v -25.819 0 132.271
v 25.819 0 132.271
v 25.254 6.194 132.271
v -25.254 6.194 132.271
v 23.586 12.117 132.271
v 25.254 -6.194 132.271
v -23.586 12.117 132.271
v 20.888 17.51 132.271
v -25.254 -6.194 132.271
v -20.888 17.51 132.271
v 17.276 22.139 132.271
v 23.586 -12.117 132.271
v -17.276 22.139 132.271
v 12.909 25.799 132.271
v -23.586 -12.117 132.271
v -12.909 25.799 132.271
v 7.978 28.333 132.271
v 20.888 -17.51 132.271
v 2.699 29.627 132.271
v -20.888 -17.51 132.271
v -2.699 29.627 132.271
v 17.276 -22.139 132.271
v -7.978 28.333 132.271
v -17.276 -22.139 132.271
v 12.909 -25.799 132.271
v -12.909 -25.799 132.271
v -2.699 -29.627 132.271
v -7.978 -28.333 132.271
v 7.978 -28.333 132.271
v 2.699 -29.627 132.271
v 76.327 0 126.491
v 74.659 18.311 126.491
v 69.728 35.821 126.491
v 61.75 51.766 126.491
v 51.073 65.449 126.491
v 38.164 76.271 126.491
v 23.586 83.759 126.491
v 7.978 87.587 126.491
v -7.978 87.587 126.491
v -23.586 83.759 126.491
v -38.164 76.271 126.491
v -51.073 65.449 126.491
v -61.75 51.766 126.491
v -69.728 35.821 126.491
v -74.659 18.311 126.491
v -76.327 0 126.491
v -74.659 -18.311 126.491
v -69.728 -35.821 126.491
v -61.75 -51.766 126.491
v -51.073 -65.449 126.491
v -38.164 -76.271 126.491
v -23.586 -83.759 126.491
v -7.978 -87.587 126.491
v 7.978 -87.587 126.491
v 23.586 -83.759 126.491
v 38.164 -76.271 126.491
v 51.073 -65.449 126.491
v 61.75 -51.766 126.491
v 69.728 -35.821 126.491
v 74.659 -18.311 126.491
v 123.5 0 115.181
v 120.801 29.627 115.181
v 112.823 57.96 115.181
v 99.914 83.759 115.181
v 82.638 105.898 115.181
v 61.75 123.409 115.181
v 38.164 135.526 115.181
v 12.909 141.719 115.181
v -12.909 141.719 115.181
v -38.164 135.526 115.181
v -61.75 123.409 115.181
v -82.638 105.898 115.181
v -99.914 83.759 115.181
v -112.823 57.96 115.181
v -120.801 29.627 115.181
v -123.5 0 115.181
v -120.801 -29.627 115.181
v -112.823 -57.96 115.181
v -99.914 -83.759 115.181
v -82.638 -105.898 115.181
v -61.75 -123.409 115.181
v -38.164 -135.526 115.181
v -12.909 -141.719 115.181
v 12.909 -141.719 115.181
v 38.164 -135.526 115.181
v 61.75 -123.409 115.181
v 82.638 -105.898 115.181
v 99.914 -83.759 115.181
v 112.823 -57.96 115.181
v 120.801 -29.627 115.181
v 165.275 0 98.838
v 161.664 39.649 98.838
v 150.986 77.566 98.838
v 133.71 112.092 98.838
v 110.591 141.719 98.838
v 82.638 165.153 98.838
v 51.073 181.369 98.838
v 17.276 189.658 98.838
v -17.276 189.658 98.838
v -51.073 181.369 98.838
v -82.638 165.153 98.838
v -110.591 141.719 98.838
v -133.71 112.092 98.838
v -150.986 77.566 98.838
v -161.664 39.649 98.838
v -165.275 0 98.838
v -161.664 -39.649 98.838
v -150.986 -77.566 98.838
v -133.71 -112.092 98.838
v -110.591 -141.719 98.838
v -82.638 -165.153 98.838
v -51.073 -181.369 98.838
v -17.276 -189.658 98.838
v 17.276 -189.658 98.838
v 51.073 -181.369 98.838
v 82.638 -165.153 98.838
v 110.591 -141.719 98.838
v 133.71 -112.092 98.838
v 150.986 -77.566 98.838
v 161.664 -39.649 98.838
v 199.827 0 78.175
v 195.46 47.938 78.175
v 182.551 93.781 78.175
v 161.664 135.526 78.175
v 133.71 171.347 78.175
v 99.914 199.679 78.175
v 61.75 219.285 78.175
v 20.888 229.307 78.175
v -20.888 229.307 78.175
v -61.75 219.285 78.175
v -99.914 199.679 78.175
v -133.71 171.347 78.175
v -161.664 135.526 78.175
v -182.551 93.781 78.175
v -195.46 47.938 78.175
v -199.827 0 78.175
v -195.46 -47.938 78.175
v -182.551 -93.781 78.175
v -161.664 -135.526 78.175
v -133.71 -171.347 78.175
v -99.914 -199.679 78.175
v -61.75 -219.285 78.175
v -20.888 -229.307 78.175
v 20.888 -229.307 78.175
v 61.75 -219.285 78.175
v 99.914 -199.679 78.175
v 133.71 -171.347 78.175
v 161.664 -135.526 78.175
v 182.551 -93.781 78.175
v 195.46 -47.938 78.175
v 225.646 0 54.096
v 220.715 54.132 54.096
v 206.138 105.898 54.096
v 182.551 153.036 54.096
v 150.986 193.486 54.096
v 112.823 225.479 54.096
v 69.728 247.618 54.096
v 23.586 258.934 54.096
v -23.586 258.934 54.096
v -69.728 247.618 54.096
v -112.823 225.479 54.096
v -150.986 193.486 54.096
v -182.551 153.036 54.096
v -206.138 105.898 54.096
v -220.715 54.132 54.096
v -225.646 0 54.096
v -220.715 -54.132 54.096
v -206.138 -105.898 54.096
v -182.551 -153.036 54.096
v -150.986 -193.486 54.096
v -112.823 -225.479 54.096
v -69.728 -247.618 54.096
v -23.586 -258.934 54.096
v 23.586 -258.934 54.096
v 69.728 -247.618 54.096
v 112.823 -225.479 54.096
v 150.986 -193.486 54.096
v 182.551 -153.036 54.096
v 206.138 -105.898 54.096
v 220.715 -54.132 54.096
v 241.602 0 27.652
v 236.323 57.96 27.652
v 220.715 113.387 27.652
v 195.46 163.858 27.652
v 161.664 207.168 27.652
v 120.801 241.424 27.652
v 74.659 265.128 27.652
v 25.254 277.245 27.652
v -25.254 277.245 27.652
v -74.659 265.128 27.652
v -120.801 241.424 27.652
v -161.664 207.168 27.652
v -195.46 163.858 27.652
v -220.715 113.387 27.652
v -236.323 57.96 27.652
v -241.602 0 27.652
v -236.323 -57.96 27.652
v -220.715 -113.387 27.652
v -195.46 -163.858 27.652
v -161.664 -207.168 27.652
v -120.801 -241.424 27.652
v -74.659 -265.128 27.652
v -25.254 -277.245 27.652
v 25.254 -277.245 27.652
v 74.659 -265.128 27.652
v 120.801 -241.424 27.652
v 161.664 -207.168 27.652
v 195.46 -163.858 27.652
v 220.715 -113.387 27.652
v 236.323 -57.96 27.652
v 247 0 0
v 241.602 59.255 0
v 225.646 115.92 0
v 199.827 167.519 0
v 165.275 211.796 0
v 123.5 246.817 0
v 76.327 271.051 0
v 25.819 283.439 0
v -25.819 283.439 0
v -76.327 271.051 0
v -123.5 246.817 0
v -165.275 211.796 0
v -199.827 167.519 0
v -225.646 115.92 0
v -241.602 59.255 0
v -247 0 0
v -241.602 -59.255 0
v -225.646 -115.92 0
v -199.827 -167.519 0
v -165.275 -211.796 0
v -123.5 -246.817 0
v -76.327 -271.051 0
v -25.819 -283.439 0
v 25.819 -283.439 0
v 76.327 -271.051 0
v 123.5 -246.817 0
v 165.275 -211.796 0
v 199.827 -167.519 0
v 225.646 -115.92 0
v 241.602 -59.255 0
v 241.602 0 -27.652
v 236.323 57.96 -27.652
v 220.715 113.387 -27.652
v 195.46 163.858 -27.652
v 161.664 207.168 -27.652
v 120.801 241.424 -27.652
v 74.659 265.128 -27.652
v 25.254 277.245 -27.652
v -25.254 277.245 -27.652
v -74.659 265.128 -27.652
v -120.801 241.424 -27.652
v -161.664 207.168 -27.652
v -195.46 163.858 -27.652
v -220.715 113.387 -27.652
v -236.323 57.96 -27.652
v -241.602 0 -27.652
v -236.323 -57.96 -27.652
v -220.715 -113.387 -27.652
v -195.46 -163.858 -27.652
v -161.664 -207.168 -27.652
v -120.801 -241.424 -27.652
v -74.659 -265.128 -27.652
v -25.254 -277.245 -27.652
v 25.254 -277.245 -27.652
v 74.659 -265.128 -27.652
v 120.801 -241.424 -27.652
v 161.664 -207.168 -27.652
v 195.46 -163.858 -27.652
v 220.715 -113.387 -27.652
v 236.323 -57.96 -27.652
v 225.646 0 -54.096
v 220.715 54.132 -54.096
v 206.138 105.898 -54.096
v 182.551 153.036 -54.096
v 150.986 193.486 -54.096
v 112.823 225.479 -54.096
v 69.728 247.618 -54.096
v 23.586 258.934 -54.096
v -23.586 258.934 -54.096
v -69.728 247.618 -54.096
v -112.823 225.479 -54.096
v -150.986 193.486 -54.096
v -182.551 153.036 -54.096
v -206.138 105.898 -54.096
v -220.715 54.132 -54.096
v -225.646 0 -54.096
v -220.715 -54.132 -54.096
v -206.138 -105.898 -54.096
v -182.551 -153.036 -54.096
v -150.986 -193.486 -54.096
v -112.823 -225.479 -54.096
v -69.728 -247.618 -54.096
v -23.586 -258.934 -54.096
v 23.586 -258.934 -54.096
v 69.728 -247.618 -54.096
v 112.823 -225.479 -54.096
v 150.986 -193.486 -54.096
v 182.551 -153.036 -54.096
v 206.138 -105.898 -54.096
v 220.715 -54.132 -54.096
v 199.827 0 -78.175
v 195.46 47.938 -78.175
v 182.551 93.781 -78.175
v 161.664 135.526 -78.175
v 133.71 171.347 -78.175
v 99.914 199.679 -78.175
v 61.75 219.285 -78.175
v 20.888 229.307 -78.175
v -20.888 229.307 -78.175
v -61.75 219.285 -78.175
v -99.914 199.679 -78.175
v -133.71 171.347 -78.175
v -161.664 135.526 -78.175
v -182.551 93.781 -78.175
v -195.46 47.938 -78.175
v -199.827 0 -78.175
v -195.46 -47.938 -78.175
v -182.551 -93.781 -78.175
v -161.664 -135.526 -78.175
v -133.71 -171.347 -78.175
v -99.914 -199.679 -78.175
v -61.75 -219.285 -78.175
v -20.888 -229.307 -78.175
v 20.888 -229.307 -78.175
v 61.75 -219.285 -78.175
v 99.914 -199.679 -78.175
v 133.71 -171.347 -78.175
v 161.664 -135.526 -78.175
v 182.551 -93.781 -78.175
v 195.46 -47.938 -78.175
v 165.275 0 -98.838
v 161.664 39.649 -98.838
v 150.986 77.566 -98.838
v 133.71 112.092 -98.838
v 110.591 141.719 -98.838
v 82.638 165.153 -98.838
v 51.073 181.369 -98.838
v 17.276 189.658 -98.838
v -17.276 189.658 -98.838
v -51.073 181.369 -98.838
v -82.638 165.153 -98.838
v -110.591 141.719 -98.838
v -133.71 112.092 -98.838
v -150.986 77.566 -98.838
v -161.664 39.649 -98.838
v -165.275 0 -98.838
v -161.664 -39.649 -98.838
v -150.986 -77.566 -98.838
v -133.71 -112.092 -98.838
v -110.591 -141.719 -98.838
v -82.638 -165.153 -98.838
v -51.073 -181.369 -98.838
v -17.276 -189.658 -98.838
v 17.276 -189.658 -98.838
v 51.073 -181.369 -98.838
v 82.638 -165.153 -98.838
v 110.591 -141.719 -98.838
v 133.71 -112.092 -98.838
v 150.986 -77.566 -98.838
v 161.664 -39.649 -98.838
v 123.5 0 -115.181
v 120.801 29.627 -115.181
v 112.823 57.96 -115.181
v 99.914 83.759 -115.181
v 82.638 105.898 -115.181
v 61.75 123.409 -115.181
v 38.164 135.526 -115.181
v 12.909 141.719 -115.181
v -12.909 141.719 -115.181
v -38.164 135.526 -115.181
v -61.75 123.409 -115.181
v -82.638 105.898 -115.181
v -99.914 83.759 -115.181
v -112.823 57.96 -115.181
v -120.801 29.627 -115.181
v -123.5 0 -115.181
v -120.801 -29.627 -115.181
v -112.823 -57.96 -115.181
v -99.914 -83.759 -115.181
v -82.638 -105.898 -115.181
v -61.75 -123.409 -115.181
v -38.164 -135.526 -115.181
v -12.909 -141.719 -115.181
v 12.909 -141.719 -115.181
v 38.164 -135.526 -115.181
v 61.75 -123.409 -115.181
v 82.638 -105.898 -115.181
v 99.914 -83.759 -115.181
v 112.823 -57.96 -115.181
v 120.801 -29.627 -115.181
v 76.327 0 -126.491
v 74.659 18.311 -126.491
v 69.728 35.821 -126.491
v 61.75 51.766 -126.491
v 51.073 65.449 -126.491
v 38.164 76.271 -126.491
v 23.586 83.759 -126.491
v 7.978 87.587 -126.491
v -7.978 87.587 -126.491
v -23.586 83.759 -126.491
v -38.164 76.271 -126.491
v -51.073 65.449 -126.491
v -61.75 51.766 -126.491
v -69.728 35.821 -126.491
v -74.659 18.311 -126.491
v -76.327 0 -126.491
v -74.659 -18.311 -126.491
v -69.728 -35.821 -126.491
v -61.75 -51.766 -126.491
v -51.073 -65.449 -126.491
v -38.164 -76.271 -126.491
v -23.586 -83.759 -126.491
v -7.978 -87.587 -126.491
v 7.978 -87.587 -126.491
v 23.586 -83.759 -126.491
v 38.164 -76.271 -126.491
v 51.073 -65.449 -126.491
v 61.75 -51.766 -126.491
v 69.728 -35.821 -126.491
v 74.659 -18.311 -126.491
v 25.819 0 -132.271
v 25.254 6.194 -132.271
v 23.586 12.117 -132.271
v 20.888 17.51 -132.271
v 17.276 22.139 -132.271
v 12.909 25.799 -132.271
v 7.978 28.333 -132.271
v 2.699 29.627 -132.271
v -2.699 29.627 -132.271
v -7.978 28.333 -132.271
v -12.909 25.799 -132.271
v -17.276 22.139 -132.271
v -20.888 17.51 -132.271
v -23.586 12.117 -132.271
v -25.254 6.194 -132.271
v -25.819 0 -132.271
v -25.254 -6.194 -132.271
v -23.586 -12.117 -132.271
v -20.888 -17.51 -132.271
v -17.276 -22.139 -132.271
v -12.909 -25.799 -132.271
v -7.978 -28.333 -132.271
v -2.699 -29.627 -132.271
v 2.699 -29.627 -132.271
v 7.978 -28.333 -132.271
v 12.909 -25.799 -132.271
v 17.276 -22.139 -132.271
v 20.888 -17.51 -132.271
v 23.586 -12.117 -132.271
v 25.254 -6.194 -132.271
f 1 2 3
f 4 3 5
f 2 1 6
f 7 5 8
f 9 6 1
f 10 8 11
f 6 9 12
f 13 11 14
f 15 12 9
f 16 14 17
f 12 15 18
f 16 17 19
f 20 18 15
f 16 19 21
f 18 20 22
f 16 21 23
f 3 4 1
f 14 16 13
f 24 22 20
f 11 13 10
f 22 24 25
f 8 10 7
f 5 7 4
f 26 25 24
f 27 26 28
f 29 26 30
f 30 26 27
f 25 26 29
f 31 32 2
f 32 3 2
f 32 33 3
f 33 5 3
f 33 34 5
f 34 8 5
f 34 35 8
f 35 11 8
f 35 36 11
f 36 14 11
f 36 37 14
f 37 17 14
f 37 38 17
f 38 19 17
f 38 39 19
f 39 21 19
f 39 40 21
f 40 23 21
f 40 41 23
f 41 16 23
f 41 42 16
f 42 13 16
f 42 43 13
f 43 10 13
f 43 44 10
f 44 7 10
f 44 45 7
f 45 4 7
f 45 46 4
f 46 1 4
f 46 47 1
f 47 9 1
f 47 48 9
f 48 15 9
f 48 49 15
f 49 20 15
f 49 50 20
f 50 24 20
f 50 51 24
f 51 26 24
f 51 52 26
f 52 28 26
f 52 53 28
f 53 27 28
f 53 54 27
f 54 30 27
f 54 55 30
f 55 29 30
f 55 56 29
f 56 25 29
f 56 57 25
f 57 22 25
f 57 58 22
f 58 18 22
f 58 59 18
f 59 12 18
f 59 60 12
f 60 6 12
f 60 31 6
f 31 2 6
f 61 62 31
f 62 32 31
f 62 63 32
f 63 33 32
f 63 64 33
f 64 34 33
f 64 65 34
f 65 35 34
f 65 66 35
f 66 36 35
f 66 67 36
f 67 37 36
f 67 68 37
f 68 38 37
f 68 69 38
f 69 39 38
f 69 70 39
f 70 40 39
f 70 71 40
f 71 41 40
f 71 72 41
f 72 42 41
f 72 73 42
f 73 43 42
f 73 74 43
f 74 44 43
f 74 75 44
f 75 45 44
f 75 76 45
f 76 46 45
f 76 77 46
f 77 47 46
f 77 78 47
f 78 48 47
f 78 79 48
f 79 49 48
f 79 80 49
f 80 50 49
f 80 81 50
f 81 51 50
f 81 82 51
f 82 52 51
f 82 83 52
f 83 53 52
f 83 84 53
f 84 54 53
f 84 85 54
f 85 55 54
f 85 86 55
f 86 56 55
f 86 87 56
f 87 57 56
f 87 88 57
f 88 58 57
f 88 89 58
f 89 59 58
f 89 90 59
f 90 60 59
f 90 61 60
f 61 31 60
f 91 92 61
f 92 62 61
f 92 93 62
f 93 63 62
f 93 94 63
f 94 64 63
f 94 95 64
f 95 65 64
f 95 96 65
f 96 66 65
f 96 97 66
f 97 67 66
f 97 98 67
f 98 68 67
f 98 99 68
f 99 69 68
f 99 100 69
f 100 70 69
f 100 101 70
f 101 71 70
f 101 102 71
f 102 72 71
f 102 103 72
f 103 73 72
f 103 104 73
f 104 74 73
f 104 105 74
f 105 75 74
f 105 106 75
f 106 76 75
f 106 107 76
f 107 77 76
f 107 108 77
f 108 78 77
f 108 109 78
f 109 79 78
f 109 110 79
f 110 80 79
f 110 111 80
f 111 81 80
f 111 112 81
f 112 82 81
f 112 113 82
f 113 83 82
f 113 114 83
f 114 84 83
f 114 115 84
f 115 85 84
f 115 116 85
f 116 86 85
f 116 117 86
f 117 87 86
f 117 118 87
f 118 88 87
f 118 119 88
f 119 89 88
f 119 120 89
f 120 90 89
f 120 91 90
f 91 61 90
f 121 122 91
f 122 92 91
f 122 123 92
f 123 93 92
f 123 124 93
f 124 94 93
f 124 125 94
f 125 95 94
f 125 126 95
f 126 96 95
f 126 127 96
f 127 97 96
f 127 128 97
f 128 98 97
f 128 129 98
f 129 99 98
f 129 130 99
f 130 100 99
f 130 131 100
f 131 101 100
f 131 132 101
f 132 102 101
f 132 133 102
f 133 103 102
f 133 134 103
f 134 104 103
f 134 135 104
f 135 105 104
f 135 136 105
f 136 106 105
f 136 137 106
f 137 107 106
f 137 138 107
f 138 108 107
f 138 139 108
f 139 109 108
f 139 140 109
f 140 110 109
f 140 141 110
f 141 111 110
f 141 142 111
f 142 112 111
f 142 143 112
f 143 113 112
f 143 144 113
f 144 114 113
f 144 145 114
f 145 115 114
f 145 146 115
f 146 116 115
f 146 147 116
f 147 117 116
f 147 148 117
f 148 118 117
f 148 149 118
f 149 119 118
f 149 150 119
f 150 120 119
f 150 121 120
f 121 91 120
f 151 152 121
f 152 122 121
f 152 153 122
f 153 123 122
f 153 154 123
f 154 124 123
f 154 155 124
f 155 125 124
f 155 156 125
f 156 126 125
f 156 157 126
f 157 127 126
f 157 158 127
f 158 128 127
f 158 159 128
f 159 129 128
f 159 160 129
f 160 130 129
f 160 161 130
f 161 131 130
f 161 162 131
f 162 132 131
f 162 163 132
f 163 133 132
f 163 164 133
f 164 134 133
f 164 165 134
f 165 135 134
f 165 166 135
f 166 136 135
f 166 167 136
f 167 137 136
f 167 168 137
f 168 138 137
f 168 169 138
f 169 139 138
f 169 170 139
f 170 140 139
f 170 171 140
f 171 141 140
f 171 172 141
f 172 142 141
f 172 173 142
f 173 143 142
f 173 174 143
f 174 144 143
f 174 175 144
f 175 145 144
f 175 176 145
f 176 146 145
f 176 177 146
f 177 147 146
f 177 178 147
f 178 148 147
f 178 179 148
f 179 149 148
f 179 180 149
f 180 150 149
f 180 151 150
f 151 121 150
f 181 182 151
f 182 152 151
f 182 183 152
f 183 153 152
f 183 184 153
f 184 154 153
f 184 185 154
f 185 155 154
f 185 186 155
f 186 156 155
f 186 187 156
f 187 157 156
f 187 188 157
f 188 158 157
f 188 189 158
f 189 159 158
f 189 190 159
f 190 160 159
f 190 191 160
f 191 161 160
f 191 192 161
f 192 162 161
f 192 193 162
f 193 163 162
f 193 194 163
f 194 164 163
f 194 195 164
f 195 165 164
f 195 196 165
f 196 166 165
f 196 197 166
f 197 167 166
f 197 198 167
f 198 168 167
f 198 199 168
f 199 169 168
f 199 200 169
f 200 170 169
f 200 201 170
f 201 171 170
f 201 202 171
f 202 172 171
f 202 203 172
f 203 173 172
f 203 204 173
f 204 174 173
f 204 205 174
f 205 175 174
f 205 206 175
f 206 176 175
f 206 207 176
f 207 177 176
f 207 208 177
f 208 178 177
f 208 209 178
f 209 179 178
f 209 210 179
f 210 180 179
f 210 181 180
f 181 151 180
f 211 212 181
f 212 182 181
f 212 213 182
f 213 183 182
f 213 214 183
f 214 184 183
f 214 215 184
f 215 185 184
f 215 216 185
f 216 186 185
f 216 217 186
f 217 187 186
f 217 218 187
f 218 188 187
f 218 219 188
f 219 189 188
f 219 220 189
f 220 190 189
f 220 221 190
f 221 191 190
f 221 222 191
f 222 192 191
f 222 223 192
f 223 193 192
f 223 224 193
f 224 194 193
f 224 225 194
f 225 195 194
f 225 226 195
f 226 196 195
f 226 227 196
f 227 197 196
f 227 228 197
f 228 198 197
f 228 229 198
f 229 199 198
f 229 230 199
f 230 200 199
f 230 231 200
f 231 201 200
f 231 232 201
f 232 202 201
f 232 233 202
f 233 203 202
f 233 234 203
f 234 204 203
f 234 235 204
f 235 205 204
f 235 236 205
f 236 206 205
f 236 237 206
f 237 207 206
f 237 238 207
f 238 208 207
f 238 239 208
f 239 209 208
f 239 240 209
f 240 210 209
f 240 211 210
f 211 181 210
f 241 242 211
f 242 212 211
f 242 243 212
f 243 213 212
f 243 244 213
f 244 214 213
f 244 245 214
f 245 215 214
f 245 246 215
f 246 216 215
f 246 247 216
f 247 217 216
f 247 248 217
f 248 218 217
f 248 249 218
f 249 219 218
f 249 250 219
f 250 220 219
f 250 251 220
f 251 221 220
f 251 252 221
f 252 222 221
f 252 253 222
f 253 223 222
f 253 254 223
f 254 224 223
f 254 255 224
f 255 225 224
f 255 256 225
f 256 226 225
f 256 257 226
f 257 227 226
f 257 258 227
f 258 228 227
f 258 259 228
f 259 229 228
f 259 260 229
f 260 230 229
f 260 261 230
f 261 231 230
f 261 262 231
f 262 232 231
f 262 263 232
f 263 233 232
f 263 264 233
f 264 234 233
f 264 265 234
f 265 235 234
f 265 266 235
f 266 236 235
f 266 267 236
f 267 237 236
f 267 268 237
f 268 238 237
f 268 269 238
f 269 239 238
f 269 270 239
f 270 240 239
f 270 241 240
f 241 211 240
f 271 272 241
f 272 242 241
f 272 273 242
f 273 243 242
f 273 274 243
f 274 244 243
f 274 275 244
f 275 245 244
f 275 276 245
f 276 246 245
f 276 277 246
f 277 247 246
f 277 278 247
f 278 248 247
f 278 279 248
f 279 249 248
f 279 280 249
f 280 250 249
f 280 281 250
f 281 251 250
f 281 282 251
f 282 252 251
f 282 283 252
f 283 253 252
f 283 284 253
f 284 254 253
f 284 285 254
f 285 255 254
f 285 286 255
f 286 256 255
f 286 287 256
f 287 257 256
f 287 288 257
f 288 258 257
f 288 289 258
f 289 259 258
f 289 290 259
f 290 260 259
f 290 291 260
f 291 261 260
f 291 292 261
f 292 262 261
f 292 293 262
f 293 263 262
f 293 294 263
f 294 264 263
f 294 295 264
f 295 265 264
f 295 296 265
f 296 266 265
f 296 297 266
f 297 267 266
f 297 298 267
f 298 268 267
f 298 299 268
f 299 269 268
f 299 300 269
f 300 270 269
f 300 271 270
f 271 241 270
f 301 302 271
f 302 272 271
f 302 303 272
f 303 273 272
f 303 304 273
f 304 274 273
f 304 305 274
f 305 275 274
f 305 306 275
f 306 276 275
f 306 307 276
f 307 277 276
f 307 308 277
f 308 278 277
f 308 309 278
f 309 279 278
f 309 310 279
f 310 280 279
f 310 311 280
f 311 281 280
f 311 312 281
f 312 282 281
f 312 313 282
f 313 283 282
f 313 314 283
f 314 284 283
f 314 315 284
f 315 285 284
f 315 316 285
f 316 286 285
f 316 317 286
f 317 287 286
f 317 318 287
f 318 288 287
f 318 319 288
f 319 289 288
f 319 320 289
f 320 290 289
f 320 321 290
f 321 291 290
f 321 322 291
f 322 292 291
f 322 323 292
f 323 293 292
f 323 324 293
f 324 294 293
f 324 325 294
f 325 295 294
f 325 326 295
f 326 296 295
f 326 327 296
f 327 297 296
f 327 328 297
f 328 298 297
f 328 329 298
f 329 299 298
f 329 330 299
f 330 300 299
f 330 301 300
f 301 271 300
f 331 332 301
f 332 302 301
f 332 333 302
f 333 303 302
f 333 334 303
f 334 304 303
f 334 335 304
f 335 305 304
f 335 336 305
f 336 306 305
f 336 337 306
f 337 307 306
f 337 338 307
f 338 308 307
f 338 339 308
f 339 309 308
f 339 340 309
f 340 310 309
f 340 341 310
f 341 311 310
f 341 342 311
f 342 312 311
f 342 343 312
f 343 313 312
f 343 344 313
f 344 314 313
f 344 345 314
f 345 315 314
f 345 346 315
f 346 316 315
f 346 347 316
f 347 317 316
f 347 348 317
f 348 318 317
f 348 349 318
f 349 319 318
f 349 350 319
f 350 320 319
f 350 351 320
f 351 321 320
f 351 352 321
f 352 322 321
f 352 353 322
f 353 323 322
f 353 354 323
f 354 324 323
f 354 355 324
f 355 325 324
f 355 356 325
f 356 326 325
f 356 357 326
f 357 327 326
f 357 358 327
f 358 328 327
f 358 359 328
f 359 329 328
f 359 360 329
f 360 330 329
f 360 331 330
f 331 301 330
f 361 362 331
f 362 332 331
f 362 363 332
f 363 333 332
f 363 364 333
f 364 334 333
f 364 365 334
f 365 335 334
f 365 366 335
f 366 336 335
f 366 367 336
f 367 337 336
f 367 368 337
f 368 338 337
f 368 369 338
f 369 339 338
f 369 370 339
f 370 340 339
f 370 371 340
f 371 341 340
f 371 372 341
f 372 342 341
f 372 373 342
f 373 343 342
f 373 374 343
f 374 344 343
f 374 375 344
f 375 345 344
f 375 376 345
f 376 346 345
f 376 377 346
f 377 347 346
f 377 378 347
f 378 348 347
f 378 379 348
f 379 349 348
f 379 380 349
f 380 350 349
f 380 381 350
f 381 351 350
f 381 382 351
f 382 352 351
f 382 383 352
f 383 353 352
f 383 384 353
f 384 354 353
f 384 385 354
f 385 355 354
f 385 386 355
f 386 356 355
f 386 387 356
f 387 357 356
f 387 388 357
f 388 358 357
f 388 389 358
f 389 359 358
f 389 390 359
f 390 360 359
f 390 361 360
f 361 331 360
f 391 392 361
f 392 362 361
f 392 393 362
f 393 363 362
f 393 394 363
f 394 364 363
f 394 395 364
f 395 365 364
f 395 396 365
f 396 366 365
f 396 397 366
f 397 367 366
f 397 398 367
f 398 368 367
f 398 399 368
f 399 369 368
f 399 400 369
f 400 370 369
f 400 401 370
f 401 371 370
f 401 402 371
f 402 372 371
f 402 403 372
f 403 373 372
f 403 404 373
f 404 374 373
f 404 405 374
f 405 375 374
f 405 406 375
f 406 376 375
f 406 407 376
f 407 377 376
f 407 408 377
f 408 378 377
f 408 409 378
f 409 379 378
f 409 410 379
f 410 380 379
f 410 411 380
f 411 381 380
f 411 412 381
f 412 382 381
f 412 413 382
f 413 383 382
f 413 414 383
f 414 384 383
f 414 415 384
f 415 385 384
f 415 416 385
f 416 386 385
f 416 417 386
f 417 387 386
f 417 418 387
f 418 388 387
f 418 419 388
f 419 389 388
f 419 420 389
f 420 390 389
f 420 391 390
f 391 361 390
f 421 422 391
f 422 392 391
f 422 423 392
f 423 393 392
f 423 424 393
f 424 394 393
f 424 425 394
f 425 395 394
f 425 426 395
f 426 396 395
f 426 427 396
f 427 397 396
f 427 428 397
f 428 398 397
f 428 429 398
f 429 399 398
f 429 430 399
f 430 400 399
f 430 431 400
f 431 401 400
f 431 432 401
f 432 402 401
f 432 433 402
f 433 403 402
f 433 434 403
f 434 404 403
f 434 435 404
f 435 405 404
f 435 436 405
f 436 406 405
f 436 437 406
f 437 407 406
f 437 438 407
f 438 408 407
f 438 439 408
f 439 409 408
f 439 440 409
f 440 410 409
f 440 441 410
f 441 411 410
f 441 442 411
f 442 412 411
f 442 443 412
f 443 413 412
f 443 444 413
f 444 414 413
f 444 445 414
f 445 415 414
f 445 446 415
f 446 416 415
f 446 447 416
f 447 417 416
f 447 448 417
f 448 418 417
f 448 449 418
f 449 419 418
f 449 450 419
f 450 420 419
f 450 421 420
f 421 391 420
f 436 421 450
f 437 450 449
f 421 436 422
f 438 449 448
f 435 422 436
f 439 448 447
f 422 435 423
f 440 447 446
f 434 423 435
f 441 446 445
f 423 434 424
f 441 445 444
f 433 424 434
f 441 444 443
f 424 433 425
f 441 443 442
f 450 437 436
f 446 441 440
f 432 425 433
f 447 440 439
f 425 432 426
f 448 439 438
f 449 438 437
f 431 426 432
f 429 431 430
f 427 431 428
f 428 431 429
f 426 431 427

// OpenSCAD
// Generated by SolidPython 1.0.1 on 2020-07-29 00:46:51


scale(v = [13, 15, 7]) {
	sphere(r = 19);
}
/***********************************************
*********      SolidPython code:      **********
************************************************
 
# import packages: SolidPython
from solid import *
from solid.utils import *
from itertools import chain, combinations, permutations


class Resize:

    def __init__(self, scad_file):
        self.scad_file = scad_file
        #self.scad_file = import_scad(scad_file)
        # cone/cylinder param:
        self.r1 = 0
        self.r2 = 0
        self.h = 0
        # rectangular prism param:
        self.w = 0
        self.l = 0
        # ellipse param:
        self.r = 0

    # import OpenScad code (file name corresponds to shape)


    # classify shape + parameters
    def assign(self, param1, param2, param3):
        if self.scad_file == 'cone.scad':
            self.r1 = param1
            self.r2 = param2
            self.h = param3
        elif self.scad_file == 'cylinder.scad':
            self.r1 = param1
            self.r2 = param2
            self.h = param3
        elif self.scad_file == 'rectangularPrism.scad':
            self.h = param1
            self.l = param2
            self.w = param3
        else:
            self.r = param1
            self.h = param2

    # resize parameters
    def iterate(self):
        x = range(3, 20, 2)
        i = 1
        if self.scad_file == 'cone.scad':
            tempList = list(permutations(x, 2))
            for temp in tempList:
                param1 = temp[0]
                param2 = temp[1]
                filepath = 'produced_scad_files/' + 'cone' + str(param1) + '_' + str(param2) + '_' + '.scad'
                scad_render_to_file(cylinder(h=param1, r1=param2, r2=0), filepath)

        elif self.scad_file == 'cylinder.scad':
            tempList = list(permutations(x, 3))
            for temp in tempList:
                param1 = temp[0]
                param2 = temp[1]
                filepath = 'produced_scad_files/' + 'cylinder' + str(param1) + '_' + str(param2) + '_' + '.scad'
                scad_render_to_file(cylinder(h=param1, r1=param2, r2=param2), filepath)

        elif self.scad_file == 'rectangularPrism.scad':
            tempList = list(permutations(x, 3))
            for temp in tempList:
                param1 = temp[0]
                param2 = temp[1]
                param3 = temp[2]
                filepath = 'produced_scad_files/' + 'rectangularPrism' + str(param1) + '_' + str(param2) + '_' + str(
                    param3) + '.scad'
                scad_render_to_file(cube(size=(param1, param2, param3)), filepath)

        elif self.scad_file == 'ellipse.scad':
            tempList = list(permutations(x, 4))
            for temp in tempList:
                param1 = temp[0]
                param2 = temp[1]
                param3 = temp[2]
                param4 = temp[3]
                filepath = 'produced_scad_files/' + 'ellipse' + str(param1) + '_' + str(param2) + '_' + str(param3) + '_' + str(param4) + '.scad'
                scad_render_to_file(scale([param1, param2, param3])(sphere(r=param4)), filepath)

    def render_to_scadfile(self):
        scad_render_to_file(scad, 'example.scad') 
 
************************************************/
